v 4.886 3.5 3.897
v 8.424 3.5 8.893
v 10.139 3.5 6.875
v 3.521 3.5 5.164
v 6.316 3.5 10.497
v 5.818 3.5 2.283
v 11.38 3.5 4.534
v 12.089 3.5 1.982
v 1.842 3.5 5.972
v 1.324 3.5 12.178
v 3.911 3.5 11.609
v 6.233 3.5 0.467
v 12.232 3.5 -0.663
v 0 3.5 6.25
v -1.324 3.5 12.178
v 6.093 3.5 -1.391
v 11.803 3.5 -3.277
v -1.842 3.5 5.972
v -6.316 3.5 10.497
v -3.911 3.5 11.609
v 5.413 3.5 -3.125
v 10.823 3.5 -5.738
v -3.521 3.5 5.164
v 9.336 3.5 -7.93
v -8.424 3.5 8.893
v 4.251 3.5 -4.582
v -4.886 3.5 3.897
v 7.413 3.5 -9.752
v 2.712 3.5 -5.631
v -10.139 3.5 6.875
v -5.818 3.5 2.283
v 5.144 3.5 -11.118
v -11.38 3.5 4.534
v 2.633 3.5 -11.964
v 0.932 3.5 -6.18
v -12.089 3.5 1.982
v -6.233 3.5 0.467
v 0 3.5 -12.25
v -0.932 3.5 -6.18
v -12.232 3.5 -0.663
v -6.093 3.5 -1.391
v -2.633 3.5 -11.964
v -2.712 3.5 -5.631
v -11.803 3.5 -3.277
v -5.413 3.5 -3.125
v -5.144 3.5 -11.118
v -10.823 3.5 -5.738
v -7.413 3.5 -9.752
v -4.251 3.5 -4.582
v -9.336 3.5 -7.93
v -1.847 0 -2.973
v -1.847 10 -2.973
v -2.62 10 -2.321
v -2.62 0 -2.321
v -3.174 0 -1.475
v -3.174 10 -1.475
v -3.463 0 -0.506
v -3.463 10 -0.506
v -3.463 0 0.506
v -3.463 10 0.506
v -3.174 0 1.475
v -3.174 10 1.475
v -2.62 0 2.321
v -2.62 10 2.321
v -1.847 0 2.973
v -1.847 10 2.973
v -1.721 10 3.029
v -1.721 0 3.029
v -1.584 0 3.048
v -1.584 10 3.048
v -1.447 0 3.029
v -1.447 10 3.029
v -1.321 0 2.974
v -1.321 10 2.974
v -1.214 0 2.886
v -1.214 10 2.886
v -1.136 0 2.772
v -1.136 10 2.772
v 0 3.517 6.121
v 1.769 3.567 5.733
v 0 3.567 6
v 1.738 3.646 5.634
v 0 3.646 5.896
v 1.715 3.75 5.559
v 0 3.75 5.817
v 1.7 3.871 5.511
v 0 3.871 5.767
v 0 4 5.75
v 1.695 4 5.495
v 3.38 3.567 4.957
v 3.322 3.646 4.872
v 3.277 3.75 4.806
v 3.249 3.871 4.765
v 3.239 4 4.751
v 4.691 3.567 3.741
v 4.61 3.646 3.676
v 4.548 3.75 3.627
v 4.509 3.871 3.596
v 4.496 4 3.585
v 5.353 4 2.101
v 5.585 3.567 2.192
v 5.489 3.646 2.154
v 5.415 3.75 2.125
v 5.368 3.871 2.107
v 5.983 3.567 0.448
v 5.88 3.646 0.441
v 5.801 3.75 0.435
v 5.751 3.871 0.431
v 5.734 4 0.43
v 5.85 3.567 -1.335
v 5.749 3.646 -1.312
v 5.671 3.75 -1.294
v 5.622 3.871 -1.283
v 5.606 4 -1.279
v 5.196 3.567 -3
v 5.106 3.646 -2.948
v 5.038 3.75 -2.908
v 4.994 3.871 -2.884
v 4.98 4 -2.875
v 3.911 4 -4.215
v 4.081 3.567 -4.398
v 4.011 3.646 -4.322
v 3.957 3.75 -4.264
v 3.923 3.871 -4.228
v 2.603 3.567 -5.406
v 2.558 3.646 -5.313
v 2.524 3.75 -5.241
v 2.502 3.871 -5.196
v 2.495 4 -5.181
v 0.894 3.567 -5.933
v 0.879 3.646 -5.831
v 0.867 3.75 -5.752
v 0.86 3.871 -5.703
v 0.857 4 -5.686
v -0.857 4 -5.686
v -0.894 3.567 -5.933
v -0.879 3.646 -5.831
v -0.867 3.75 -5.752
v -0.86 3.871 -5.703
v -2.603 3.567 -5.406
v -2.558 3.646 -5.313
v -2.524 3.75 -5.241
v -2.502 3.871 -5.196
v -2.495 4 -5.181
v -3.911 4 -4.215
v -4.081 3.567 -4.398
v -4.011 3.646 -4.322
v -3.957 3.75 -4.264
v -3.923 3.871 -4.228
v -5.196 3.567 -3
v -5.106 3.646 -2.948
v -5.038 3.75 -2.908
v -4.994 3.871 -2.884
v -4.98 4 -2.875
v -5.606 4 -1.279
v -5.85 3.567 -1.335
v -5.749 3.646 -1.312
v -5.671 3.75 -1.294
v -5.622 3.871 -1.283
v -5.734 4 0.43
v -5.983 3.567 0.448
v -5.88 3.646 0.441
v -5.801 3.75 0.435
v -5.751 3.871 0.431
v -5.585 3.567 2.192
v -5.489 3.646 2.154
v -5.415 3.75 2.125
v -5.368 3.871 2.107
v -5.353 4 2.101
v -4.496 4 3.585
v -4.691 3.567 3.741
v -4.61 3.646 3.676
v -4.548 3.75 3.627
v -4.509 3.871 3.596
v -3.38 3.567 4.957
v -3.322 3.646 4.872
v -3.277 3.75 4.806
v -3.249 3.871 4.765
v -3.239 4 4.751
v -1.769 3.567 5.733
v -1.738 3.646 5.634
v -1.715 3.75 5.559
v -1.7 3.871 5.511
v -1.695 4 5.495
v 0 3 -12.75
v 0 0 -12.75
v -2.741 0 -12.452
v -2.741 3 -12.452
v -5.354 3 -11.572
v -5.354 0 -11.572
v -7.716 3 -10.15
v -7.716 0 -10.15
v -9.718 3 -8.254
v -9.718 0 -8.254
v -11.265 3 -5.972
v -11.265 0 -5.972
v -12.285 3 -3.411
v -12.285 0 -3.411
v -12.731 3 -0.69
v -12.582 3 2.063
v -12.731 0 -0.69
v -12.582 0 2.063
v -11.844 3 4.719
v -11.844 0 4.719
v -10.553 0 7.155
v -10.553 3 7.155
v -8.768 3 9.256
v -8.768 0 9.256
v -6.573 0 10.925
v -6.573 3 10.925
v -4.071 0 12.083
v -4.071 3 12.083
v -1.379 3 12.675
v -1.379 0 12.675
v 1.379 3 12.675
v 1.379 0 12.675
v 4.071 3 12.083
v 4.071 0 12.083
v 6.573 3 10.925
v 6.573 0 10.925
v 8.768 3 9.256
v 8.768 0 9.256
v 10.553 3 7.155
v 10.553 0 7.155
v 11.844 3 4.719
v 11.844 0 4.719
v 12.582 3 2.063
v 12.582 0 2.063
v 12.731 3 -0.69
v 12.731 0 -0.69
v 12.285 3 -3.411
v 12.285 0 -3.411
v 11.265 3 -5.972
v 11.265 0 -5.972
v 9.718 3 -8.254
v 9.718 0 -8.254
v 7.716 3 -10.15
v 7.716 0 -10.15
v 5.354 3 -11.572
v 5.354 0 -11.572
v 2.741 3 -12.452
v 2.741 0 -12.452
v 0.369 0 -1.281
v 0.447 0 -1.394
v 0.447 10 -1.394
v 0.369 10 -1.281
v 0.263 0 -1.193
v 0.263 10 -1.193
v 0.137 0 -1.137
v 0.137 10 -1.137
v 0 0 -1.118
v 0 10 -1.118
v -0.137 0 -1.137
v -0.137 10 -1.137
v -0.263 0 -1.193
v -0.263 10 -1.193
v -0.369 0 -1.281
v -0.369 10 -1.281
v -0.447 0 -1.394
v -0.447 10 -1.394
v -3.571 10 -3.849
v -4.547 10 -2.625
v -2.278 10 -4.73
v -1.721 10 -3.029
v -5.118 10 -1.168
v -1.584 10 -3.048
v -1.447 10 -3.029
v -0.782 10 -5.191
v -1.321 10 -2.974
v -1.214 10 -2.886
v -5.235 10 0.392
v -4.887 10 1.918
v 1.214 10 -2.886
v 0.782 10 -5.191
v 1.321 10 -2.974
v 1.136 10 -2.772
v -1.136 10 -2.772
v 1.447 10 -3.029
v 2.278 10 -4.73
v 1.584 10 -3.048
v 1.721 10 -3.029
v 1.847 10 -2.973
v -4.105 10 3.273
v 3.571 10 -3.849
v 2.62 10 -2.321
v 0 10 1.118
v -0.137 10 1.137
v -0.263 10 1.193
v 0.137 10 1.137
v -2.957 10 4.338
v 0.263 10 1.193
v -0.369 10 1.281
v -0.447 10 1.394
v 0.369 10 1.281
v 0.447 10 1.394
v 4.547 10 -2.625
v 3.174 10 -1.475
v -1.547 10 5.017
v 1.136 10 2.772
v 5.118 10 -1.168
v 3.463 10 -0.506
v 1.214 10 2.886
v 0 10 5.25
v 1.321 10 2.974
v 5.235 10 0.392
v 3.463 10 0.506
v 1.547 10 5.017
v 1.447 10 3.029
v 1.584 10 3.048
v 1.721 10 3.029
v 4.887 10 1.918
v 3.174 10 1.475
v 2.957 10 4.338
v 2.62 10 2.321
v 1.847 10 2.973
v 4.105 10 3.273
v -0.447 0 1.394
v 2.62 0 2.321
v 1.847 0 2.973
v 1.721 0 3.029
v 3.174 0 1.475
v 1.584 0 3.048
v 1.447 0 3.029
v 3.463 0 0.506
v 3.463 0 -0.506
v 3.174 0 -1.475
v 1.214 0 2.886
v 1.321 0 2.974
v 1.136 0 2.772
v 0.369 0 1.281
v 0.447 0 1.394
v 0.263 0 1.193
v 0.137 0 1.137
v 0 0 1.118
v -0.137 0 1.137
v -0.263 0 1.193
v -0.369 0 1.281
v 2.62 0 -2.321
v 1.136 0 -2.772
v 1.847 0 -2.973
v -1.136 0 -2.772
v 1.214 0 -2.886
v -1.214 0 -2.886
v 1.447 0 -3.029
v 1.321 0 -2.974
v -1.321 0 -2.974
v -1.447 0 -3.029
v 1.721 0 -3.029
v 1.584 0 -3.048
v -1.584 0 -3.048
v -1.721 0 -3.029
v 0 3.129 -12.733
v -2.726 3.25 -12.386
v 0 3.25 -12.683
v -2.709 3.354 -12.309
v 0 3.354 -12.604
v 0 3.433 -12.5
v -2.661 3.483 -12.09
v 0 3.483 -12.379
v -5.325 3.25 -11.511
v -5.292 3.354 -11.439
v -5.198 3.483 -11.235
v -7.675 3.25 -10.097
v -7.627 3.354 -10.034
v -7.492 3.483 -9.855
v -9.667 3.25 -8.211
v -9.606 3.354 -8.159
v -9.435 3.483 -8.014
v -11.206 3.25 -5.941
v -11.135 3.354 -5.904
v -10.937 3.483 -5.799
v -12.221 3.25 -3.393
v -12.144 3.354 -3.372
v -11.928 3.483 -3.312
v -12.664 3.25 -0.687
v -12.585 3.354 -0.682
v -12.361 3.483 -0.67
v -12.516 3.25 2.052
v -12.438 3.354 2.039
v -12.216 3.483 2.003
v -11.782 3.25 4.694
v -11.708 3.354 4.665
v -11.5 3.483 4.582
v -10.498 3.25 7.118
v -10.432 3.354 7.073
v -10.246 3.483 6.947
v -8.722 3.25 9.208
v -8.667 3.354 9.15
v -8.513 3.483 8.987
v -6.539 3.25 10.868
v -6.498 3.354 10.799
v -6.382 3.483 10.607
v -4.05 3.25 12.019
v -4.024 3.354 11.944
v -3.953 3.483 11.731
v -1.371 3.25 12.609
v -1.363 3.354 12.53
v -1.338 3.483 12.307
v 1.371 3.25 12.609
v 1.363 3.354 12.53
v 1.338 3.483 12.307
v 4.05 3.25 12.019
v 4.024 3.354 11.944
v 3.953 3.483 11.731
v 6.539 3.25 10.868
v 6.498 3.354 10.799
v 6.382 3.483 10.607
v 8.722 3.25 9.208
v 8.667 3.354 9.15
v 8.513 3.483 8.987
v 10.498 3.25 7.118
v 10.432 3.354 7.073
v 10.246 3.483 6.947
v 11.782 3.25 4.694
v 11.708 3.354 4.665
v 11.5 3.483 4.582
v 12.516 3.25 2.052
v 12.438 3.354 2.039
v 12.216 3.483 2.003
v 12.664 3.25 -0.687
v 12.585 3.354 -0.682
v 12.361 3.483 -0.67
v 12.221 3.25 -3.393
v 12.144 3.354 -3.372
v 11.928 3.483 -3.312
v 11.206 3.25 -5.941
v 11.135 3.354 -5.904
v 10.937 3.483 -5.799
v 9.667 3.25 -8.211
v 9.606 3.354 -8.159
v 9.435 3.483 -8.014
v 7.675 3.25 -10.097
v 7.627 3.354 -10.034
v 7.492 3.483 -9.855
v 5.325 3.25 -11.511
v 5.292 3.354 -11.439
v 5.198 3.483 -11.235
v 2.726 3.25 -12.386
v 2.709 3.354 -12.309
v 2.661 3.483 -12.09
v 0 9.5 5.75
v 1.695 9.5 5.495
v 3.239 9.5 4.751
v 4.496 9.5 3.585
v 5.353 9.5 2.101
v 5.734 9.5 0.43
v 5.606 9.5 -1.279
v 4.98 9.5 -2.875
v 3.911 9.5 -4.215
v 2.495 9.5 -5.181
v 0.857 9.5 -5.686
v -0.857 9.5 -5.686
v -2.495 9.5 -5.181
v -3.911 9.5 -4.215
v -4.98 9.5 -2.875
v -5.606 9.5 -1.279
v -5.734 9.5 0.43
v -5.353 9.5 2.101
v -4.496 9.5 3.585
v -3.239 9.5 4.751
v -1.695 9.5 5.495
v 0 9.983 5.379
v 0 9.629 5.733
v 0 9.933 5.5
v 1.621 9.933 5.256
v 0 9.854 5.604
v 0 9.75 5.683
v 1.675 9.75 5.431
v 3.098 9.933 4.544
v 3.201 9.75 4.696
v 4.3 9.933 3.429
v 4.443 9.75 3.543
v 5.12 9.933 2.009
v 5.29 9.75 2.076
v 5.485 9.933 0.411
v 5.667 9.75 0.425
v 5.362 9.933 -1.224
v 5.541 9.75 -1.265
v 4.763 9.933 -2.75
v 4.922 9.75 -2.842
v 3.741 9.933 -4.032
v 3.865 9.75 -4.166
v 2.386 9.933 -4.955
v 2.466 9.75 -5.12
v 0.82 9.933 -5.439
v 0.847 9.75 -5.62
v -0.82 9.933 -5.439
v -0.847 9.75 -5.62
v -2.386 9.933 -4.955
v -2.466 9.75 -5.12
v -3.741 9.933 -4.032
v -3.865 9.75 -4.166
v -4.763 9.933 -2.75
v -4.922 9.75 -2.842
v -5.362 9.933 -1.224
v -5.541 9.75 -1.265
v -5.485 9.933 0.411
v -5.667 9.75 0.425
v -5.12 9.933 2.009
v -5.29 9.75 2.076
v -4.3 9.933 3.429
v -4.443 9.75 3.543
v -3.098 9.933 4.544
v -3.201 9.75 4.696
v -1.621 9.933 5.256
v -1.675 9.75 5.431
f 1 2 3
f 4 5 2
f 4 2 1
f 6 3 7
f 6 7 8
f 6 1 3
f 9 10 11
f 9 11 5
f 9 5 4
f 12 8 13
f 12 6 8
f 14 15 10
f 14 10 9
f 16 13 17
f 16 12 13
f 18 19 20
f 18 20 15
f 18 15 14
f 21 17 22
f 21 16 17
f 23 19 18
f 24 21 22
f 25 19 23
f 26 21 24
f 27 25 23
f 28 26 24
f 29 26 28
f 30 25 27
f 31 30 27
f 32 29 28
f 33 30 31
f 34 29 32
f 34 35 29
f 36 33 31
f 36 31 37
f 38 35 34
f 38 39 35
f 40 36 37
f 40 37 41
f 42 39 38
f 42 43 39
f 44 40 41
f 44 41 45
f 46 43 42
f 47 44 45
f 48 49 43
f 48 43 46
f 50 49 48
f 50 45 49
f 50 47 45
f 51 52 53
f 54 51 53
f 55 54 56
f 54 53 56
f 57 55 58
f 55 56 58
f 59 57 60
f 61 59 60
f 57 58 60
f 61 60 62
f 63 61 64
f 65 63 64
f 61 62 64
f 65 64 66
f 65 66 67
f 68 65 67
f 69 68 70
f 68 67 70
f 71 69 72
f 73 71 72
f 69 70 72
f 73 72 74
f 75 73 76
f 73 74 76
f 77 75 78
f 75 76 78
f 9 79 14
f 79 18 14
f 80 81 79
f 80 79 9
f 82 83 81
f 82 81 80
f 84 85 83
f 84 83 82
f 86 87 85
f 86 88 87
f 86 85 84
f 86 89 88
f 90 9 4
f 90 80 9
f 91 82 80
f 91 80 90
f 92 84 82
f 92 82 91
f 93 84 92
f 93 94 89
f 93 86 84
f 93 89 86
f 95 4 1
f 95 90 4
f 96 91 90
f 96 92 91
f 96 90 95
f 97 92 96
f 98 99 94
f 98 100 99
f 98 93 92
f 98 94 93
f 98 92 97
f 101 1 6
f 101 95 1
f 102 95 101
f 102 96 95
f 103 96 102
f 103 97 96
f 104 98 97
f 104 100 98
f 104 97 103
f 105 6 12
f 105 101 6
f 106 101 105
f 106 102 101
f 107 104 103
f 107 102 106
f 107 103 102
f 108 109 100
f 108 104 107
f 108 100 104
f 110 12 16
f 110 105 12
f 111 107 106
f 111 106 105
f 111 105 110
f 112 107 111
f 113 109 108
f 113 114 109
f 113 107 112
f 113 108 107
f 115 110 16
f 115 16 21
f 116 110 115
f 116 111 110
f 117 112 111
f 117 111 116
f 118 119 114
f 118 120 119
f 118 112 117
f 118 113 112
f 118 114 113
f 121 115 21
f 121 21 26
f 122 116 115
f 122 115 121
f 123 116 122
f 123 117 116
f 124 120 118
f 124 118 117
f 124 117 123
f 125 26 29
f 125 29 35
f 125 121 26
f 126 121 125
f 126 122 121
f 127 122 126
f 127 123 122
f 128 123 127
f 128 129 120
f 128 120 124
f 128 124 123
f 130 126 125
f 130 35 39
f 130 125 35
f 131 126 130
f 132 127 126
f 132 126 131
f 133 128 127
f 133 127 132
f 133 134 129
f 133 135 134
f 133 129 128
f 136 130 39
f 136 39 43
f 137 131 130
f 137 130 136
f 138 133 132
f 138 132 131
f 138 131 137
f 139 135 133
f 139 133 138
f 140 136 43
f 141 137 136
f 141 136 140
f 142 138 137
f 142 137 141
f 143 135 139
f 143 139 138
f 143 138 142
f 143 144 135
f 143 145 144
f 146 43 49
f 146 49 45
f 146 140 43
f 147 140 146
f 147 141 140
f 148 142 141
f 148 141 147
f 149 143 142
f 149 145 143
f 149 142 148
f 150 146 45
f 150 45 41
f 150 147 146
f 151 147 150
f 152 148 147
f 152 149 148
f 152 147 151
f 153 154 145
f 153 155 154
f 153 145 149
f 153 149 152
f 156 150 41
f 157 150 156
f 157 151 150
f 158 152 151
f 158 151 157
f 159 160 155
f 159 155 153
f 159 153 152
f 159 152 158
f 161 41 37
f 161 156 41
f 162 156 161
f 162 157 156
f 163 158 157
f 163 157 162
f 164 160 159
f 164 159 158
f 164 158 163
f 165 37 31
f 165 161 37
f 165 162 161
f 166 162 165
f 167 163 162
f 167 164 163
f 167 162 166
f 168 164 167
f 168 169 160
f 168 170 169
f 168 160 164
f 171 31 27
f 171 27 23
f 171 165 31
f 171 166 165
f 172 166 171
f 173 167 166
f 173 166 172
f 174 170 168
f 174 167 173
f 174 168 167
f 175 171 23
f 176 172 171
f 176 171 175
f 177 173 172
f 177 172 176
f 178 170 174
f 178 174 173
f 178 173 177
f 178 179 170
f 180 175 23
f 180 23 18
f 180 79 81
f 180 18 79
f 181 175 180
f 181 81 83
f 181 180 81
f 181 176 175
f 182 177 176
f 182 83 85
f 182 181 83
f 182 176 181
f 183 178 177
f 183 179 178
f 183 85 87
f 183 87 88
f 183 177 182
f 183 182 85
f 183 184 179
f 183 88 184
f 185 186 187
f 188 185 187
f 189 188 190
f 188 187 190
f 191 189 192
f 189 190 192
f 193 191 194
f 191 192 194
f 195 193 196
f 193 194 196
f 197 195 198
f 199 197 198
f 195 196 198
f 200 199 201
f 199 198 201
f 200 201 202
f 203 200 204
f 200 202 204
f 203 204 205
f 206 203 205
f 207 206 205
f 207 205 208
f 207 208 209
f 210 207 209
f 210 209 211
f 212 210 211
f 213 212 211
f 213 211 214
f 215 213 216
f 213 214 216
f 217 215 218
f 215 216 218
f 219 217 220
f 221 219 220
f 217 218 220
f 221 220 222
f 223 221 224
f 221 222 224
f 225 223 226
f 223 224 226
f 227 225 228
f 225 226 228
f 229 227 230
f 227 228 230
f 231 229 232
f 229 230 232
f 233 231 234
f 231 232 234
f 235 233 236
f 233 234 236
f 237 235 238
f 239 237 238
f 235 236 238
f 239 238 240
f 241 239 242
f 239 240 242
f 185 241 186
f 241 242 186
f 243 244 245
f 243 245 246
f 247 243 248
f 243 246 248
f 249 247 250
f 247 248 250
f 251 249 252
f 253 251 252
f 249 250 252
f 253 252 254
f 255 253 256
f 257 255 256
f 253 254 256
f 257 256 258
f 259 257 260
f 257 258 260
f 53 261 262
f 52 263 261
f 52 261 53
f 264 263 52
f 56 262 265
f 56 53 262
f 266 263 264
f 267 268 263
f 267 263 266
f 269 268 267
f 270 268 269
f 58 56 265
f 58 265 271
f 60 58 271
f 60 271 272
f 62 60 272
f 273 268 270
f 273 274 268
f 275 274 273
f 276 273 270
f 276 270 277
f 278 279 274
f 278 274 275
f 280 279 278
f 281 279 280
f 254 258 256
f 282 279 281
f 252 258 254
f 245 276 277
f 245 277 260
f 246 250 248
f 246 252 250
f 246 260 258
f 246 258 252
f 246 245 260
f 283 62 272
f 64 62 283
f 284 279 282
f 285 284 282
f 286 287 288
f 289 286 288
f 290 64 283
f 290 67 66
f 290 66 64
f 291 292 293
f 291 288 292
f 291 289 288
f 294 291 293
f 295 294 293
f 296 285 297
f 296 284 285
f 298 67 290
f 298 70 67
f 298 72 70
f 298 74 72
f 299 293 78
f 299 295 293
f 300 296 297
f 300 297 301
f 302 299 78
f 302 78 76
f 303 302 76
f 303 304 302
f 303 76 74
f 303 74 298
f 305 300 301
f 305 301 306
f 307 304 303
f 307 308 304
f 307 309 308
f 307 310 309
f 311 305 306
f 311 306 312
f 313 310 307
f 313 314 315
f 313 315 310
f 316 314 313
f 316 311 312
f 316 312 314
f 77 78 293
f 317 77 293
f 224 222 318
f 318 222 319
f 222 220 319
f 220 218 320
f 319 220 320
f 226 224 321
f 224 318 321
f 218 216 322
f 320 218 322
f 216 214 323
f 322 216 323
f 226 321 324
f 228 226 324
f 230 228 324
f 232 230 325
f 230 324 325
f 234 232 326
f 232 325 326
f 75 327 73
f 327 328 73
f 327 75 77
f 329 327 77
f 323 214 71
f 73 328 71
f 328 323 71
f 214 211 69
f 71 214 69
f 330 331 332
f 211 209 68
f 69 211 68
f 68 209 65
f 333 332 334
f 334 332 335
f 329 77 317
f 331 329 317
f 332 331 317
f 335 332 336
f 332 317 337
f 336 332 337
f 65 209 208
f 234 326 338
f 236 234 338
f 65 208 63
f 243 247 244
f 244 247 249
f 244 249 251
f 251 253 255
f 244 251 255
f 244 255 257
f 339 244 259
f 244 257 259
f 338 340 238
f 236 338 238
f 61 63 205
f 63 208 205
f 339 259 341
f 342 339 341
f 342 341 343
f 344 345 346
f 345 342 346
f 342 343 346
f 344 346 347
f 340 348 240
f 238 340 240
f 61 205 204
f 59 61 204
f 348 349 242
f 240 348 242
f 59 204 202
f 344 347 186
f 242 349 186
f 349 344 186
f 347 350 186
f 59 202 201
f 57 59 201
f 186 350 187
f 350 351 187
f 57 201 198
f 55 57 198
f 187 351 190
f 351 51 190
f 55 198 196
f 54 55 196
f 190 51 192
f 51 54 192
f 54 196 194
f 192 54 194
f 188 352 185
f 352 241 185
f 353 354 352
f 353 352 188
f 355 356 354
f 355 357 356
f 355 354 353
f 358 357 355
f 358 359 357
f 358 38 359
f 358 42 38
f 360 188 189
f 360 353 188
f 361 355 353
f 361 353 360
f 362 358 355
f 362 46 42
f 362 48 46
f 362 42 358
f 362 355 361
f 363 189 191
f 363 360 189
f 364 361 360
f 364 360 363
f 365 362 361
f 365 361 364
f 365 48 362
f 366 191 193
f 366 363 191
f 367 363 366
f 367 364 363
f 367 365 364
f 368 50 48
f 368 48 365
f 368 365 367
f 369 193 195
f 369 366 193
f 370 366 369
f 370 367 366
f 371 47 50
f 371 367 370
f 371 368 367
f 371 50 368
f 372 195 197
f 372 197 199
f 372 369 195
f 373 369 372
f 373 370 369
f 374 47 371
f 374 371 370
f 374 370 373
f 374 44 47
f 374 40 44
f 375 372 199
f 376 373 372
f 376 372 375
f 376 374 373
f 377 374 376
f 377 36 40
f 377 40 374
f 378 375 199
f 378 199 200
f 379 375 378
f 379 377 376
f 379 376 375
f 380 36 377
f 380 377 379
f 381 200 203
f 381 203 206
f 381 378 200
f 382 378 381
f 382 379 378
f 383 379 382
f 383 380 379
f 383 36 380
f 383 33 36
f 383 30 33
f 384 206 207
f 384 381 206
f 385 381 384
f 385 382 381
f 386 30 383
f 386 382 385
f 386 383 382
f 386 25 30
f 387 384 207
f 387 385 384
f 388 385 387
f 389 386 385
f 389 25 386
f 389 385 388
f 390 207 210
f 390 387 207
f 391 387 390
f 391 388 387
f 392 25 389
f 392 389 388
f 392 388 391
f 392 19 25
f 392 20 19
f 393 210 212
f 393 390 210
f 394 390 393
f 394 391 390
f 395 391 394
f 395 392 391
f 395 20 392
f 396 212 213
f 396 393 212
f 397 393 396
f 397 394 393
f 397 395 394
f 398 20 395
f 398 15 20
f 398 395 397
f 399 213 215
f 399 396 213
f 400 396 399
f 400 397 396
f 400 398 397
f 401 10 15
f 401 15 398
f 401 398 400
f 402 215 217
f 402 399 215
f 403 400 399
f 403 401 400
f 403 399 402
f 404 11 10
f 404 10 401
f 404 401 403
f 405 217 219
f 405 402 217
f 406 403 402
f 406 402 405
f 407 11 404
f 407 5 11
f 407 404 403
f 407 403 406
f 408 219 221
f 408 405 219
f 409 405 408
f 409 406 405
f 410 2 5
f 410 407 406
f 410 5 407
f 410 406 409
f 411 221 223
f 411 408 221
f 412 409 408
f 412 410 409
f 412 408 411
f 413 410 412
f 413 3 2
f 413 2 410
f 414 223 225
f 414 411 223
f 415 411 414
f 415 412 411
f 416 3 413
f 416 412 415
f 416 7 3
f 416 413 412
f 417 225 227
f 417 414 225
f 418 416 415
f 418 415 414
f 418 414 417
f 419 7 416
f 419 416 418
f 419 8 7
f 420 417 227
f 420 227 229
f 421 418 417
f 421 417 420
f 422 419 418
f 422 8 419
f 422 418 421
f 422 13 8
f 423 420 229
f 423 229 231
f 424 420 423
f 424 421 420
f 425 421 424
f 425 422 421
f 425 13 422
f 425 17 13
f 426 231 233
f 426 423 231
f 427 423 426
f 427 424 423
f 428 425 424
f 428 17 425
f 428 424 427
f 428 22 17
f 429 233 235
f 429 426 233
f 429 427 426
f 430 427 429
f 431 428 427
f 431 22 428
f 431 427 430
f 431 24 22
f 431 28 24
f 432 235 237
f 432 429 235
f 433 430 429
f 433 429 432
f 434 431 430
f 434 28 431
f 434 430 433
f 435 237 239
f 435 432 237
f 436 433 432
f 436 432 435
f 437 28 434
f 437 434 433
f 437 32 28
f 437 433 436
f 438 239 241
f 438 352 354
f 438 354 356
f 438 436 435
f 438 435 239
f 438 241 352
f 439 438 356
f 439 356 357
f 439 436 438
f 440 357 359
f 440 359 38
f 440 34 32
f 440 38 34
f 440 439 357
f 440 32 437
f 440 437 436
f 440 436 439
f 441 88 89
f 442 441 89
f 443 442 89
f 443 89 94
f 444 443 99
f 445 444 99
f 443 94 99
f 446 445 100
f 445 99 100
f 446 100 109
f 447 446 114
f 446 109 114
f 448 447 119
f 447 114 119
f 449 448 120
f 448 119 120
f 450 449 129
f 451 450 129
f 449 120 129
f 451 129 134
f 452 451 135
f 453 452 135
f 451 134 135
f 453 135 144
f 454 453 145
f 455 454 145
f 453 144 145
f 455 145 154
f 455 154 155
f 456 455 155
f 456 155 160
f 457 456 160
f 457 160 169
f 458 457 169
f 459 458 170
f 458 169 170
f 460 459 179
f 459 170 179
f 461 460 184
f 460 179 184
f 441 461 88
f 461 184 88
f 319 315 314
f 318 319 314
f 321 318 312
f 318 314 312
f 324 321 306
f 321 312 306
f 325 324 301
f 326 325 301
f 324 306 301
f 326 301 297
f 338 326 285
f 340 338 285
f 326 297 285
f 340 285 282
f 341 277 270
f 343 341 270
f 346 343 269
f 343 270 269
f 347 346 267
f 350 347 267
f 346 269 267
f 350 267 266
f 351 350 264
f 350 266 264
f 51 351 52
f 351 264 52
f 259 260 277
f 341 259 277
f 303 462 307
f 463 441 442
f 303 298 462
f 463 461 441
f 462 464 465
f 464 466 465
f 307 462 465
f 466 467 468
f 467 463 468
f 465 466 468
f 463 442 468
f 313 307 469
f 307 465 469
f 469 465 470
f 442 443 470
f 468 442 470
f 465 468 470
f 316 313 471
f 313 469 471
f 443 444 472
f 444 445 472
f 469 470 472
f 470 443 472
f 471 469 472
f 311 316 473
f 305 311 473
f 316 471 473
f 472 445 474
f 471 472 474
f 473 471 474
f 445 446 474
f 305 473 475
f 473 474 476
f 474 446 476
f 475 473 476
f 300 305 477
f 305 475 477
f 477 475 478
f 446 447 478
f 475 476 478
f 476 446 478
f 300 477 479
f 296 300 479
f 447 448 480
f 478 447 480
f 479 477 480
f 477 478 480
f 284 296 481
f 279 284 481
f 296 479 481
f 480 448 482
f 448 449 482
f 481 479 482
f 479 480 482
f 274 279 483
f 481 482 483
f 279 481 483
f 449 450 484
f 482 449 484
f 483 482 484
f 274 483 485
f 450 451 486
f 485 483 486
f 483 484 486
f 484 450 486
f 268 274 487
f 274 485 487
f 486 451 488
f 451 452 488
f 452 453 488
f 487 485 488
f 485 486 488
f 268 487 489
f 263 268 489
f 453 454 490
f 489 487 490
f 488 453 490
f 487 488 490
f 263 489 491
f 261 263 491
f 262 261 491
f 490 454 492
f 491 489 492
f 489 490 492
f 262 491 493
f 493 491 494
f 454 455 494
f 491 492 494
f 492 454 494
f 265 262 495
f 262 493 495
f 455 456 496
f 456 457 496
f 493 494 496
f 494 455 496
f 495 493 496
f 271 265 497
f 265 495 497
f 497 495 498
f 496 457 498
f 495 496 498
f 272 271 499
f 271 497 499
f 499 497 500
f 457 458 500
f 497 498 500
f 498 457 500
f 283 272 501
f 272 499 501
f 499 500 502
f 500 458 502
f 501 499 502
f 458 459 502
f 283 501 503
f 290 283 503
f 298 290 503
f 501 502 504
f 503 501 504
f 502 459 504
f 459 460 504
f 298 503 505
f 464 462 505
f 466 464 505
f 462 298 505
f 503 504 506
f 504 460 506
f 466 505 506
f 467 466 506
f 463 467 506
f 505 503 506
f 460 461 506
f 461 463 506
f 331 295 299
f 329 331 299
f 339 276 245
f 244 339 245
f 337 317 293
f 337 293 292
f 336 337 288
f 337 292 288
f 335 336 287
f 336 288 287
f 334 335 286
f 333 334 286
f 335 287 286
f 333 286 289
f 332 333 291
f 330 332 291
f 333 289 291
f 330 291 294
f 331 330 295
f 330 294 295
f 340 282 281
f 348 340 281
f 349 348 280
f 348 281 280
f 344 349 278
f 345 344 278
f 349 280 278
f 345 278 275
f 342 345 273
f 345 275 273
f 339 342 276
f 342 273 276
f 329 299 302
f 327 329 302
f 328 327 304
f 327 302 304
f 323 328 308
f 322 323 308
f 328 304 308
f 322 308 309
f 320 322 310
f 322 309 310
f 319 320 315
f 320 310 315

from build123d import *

# Parameters (mm, degrees)
SKETCH1_R           = 12.75
BOSS_EXTRUDE2_DEPTH = 3.5
SKETCH2_R           = 5.75
BOSS_EXTRUDE3_DEPTH = 6.5
CUT_EXTRUDE1_DEPTH  = 10
FILLET3_R           = 0.5
FILLET4_R           = 0.5


with BuildPart() as part:
    # Sketch1 → Boss-Extrude2 (new body)
    with BuildSketch(Plane(origin=(0, 0, 0), x_dir=(1, 0, 0), z_dir=(0, 1, 0))):
        with Locations(Location((0, 0, 0), (0, 0, 90))):
            Circle(SKETCH1_R)
    extrude(amount=BOSS_EXTRUDE2_DEPTH)

    # Sketch2 → Boss-Extrude3 (add)
    with BuildSketch(Plane(origin=(0, 3.5, 0), x_dir=(1, 0, 0), z_dir=(0, 1, 0))):
        with Locations(Location((0, 0, 0), (0, 0, 270))):
            Circle(SKETCH2_R)
    extrude(amount=BOSS_EXTRUDE3_DEPTH)

    # Sketch3 → Cut-Extrude1 (cut)
    with BuildSketch(Plane(origin=(0, 10, 0), x_dir=(1, 0, 0), z_dir=(0, 1, 0))):
        with BuildLine():
            Line((-0.447213595, 1.394427191), (-1.135934639, 2.771869278))
            ThreePointArc((-1.135934639, 2.771869278), (-1.447076632, 3.029390861), (-1.847006274, 2.972972894))
            ThreePointArc((-1.847006274, 2.972972894), (-3.5, 0), (-1.847006274, -2.972972894))
            ThreePointArc((-1.847006274, -2.972972894), (-1.447076632, -3.029390861), (-1.135934639, -2.771869278))
            Line((-1.135934639, -2.771869278), (-0.447213595, -1.394427191))
            ThreePointArc((-0.447213595, -1.394427191), (0, -1.118033989), (0.447213595, -1.394427191))
            Line((0.447213595, -1.394427191), (1.135934639, -2.771869278))
            ThreePointArc((1.135934639, -2.771869278), (1.447076632, -3.029390861), (1.847006274, -2.972972894))
            ThreePointArc((1.847006274, -2.972972894), (3.5, 0), (1.847006274, 2.972972894))
            ThreePointArc((1.847006274, 2.972972894), (1.447076632, 3.029390861), (1.135934639, 2.771869278))
            Line((1.135934639, 2.771869278), (0.447213595, 1.394427191))
            ThreePointArc((0.447213595, 1.394427191), (0, 1.118033989), (-0.447213595, 1.394427191))
        make_face()
    extrude(amount=-CUT_EXTRUDE1_DEPTH, mode=Mode.SUBTRACT)

    # Fillet3
    fillet3_edges = [part.edges().sort_by_distance(p)[0] for p in [
        (0, 3.5, 12.75),
        (0, 3.5, -5.75),
    ]]
    fillet(fillet3_edges, radius=FILLET3_R)

    # Fillet4
    fillet4_edges = [part.edges().sort_by_distance(p)[0] for p in [
        (0, 10, -5.75),
    ]]
    fillet(fillet4_edges, radius=FILLET4_R)


solid = part.part
